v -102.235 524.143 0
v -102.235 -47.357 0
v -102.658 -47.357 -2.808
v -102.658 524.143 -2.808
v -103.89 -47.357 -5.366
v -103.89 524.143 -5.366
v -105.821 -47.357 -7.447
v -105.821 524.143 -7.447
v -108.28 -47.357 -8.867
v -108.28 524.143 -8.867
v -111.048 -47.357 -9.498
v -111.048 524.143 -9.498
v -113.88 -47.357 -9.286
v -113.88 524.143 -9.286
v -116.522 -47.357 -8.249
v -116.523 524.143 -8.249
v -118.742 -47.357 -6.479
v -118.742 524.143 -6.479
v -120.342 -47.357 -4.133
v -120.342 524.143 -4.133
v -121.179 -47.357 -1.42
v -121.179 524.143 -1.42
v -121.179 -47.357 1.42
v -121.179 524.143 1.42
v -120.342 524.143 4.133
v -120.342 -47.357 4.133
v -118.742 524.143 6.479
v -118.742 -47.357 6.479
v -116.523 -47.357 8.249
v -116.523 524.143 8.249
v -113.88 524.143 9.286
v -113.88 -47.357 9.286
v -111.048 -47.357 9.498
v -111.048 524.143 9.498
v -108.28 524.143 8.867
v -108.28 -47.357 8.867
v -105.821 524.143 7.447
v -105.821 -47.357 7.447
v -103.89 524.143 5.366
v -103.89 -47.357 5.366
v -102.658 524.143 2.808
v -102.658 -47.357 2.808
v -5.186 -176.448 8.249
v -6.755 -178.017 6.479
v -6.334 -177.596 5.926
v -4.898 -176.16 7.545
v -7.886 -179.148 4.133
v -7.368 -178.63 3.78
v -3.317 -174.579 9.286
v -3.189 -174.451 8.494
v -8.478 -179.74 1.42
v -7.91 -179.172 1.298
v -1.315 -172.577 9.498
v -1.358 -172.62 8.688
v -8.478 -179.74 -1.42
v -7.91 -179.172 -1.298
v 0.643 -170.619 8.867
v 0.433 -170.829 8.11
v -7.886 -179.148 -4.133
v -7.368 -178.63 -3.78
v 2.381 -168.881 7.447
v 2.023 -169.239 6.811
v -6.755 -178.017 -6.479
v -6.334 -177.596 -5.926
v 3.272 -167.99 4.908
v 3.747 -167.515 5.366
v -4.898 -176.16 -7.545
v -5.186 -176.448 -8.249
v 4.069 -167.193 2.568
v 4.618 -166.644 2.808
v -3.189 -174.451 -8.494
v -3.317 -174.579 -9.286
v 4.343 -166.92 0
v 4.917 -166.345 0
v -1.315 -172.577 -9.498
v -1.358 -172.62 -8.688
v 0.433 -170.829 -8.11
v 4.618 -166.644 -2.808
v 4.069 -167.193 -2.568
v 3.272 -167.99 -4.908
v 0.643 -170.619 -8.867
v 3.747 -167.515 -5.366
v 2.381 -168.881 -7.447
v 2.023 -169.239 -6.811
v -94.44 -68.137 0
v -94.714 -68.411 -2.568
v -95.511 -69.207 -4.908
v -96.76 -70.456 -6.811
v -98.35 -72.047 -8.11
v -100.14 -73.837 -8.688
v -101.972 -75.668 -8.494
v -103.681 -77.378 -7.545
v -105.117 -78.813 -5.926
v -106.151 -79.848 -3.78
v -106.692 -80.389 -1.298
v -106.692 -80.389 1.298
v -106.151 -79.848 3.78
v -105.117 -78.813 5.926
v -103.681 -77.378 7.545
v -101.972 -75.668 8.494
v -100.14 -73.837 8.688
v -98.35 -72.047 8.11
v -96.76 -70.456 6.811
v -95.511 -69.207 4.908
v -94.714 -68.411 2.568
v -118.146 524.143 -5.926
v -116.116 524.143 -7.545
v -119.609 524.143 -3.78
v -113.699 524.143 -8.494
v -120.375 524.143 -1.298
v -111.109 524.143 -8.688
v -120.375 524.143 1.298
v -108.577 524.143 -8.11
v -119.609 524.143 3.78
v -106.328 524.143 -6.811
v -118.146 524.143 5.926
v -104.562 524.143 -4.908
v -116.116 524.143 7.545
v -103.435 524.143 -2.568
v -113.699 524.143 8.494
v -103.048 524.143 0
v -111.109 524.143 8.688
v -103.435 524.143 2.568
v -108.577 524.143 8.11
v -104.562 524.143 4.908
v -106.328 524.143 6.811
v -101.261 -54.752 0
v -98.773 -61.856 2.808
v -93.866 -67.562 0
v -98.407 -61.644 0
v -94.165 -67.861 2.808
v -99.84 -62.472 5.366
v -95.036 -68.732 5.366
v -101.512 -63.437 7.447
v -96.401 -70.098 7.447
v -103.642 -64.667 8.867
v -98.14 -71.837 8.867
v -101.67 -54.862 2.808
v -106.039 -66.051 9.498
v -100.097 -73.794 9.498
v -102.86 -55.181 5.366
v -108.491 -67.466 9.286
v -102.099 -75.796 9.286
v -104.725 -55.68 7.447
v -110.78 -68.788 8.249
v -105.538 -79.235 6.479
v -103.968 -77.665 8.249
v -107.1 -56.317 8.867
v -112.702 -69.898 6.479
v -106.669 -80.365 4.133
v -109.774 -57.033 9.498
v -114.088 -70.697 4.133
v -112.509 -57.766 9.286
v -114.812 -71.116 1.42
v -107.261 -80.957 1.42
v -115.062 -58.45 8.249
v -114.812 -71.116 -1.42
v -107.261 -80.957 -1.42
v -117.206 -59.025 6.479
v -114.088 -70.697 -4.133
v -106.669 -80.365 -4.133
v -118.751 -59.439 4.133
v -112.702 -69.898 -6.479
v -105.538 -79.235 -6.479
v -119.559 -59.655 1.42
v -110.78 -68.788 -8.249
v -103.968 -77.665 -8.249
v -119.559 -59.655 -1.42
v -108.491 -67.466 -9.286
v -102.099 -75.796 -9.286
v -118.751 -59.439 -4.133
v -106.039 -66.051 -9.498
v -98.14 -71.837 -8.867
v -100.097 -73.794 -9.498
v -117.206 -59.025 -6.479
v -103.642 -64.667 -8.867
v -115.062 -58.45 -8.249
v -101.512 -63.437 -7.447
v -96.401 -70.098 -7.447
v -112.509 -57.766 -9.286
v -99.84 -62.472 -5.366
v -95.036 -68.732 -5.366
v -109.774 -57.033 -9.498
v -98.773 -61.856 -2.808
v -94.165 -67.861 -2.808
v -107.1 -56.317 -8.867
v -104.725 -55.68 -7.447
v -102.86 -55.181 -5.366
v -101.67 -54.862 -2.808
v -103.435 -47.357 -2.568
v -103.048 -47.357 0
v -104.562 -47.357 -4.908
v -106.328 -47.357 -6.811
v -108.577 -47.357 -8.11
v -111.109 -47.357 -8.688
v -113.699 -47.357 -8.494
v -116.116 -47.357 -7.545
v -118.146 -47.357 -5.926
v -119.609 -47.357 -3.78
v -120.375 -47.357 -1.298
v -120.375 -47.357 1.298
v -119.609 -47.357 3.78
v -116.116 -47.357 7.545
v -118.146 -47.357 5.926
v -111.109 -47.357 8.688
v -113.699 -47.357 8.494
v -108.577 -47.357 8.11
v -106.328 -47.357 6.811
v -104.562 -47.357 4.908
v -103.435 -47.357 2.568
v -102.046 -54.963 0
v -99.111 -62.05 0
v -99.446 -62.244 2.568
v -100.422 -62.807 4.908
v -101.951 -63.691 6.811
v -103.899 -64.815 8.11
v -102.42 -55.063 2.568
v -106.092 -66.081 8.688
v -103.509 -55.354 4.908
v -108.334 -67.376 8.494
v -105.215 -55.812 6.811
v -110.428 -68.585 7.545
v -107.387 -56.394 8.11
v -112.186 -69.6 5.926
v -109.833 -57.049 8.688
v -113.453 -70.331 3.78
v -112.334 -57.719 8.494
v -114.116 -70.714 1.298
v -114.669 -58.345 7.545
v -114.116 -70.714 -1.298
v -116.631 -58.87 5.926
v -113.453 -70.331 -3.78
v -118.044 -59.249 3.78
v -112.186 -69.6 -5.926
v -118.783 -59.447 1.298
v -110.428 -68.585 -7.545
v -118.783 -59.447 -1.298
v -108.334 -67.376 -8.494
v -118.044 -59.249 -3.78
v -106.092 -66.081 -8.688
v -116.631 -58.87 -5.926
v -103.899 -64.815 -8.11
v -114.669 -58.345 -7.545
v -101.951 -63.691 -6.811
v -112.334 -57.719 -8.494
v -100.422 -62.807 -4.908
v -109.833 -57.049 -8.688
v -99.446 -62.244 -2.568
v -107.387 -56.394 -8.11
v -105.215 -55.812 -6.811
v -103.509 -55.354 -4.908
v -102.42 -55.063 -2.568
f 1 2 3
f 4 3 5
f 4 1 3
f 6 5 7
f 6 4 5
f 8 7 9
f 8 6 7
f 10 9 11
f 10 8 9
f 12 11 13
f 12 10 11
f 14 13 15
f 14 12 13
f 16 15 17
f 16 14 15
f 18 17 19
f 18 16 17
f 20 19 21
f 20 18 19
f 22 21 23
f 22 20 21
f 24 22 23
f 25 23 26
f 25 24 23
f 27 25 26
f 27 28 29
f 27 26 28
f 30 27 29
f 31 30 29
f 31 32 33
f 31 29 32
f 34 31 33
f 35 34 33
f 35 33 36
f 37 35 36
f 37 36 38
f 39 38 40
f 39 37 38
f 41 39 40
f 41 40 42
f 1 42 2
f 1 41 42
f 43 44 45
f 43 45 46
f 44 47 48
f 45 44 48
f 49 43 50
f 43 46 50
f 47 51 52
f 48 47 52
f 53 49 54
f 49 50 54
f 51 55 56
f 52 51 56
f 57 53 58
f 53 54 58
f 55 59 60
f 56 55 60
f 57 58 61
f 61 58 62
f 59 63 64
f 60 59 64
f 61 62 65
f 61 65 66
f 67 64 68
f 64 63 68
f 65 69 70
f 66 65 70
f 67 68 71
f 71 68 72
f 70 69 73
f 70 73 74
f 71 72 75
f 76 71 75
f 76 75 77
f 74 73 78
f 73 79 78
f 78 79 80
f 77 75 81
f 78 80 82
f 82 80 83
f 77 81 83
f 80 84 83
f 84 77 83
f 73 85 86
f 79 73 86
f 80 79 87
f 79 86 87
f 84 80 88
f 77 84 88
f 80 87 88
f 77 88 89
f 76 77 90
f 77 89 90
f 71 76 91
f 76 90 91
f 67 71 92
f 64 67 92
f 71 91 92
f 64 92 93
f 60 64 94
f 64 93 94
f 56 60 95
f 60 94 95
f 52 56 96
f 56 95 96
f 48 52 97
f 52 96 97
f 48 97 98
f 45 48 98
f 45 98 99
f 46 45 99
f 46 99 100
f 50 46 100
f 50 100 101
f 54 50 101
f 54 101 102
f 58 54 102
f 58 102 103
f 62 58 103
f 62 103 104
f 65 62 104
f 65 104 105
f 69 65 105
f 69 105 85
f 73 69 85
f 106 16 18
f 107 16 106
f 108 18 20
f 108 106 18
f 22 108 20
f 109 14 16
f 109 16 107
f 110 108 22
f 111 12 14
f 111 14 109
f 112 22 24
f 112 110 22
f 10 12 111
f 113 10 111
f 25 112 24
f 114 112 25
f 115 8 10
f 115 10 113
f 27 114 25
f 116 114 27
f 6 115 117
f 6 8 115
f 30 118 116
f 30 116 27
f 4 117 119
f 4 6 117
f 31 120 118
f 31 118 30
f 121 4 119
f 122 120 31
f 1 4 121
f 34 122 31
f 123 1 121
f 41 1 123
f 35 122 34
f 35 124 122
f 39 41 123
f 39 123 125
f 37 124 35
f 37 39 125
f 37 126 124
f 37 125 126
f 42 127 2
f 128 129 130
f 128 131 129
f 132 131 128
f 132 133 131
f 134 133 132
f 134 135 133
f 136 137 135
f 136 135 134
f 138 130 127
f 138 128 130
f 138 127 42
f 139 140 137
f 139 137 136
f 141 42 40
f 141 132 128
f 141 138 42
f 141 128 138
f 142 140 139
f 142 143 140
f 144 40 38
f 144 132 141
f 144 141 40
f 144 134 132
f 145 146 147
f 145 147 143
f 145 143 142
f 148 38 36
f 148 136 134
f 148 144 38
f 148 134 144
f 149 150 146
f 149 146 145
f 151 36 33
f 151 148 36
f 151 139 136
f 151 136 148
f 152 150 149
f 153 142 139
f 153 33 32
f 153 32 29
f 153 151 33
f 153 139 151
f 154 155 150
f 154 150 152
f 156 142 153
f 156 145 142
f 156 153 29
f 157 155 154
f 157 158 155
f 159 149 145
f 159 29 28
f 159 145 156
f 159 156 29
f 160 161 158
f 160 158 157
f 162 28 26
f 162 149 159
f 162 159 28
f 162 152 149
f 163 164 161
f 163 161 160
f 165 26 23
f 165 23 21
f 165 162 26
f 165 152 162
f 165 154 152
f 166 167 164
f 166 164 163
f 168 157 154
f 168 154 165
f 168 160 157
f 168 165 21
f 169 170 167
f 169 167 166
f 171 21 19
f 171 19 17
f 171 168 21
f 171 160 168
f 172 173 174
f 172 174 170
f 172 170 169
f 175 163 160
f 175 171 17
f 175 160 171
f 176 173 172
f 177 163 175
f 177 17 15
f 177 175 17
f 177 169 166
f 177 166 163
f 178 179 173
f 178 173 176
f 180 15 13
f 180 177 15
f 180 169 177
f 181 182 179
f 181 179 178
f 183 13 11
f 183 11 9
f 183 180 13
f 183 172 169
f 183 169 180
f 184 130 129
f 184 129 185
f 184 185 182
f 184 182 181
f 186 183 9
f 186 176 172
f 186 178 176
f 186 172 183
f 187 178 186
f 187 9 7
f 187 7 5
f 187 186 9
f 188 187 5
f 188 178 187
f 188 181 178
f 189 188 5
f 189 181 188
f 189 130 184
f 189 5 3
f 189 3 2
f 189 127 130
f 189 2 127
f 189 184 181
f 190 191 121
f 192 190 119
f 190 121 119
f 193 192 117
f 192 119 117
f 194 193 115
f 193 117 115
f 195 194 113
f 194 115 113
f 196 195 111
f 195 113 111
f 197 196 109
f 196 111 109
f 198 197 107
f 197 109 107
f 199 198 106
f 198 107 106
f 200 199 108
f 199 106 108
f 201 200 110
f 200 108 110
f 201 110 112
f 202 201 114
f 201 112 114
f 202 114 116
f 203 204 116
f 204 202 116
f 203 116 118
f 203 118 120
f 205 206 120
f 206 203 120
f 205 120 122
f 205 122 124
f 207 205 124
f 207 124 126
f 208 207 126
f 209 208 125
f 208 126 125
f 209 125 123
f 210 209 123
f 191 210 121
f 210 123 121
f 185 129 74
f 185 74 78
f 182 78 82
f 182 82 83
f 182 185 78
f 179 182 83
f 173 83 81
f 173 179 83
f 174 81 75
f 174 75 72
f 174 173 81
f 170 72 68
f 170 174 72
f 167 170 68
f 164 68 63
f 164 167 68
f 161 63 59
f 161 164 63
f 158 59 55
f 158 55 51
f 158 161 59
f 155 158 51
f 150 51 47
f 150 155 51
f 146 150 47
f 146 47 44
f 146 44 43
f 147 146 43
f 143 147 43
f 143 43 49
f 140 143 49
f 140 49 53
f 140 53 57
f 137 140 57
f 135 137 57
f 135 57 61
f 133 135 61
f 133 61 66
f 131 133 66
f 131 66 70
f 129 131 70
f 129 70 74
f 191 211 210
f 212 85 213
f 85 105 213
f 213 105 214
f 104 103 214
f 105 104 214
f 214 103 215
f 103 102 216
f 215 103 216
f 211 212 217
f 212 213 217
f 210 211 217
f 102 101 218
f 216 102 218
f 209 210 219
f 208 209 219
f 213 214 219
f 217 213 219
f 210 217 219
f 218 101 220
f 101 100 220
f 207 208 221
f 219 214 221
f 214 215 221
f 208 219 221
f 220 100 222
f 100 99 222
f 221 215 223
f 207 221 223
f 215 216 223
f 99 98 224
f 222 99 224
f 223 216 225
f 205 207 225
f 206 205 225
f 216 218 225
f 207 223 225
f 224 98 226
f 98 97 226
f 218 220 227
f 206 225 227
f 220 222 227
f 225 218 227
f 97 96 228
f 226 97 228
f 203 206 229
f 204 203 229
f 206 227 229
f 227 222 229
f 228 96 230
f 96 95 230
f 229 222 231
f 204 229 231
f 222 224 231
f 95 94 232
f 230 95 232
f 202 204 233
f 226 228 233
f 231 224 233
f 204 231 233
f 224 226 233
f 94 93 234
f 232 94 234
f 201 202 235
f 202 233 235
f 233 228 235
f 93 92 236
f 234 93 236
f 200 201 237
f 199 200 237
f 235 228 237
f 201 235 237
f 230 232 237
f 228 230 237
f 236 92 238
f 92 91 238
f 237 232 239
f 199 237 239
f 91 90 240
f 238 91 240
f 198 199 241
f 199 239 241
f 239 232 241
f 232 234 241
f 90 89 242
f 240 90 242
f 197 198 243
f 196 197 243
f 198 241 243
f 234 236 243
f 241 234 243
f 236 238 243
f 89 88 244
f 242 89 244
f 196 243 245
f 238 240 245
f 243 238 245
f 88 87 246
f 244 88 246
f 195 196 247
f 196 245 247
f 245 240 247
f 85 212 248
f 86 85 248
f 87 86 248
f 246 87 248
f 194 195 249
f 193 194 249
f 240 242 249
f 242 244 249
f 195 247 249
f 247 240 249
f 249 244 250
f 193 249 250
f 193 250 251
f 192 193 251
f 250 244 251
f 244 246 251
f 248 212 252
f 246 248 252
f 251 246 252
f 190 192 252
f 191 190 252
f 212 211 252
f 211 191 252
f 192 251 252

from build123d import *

# Parameters (mm, degrees)
SKETCH2_R   = 9.525
SKETCH2_R_2 = 8.7122


with BuildPart() as part:
    # Sweep1: sweep along a path in Sketch1
    with BuildLine(Plane.XY) as sweep1_path:
        Line((-1.817951031, -173.080098969), (-100.600768363, -74.297281637))
        ThreePointArc((-100.600768363, -74.297281637), (-108.859810189, -61.936752047), (-111.76, -47.356513274))
        Line((-111.76, -47.356513274), (-111.76, 524.143486726))
    # Sketch2 → Sweep1 (sweep)
    with BuildSketch(Plane(origin=(0, 0, 0), x_dir=(1, 0, 0), z_dir=(0, 1, 0))):
        with Locations((-111.76, 0)):
            Circle(SKETCH2_R)
        with Locations((-111.76, 0)):
            Circle(SKETCH2_R_2, mode=Mode.SUBTRACT)
    sweep(path=sweep1_path.line)


solid = part.part
